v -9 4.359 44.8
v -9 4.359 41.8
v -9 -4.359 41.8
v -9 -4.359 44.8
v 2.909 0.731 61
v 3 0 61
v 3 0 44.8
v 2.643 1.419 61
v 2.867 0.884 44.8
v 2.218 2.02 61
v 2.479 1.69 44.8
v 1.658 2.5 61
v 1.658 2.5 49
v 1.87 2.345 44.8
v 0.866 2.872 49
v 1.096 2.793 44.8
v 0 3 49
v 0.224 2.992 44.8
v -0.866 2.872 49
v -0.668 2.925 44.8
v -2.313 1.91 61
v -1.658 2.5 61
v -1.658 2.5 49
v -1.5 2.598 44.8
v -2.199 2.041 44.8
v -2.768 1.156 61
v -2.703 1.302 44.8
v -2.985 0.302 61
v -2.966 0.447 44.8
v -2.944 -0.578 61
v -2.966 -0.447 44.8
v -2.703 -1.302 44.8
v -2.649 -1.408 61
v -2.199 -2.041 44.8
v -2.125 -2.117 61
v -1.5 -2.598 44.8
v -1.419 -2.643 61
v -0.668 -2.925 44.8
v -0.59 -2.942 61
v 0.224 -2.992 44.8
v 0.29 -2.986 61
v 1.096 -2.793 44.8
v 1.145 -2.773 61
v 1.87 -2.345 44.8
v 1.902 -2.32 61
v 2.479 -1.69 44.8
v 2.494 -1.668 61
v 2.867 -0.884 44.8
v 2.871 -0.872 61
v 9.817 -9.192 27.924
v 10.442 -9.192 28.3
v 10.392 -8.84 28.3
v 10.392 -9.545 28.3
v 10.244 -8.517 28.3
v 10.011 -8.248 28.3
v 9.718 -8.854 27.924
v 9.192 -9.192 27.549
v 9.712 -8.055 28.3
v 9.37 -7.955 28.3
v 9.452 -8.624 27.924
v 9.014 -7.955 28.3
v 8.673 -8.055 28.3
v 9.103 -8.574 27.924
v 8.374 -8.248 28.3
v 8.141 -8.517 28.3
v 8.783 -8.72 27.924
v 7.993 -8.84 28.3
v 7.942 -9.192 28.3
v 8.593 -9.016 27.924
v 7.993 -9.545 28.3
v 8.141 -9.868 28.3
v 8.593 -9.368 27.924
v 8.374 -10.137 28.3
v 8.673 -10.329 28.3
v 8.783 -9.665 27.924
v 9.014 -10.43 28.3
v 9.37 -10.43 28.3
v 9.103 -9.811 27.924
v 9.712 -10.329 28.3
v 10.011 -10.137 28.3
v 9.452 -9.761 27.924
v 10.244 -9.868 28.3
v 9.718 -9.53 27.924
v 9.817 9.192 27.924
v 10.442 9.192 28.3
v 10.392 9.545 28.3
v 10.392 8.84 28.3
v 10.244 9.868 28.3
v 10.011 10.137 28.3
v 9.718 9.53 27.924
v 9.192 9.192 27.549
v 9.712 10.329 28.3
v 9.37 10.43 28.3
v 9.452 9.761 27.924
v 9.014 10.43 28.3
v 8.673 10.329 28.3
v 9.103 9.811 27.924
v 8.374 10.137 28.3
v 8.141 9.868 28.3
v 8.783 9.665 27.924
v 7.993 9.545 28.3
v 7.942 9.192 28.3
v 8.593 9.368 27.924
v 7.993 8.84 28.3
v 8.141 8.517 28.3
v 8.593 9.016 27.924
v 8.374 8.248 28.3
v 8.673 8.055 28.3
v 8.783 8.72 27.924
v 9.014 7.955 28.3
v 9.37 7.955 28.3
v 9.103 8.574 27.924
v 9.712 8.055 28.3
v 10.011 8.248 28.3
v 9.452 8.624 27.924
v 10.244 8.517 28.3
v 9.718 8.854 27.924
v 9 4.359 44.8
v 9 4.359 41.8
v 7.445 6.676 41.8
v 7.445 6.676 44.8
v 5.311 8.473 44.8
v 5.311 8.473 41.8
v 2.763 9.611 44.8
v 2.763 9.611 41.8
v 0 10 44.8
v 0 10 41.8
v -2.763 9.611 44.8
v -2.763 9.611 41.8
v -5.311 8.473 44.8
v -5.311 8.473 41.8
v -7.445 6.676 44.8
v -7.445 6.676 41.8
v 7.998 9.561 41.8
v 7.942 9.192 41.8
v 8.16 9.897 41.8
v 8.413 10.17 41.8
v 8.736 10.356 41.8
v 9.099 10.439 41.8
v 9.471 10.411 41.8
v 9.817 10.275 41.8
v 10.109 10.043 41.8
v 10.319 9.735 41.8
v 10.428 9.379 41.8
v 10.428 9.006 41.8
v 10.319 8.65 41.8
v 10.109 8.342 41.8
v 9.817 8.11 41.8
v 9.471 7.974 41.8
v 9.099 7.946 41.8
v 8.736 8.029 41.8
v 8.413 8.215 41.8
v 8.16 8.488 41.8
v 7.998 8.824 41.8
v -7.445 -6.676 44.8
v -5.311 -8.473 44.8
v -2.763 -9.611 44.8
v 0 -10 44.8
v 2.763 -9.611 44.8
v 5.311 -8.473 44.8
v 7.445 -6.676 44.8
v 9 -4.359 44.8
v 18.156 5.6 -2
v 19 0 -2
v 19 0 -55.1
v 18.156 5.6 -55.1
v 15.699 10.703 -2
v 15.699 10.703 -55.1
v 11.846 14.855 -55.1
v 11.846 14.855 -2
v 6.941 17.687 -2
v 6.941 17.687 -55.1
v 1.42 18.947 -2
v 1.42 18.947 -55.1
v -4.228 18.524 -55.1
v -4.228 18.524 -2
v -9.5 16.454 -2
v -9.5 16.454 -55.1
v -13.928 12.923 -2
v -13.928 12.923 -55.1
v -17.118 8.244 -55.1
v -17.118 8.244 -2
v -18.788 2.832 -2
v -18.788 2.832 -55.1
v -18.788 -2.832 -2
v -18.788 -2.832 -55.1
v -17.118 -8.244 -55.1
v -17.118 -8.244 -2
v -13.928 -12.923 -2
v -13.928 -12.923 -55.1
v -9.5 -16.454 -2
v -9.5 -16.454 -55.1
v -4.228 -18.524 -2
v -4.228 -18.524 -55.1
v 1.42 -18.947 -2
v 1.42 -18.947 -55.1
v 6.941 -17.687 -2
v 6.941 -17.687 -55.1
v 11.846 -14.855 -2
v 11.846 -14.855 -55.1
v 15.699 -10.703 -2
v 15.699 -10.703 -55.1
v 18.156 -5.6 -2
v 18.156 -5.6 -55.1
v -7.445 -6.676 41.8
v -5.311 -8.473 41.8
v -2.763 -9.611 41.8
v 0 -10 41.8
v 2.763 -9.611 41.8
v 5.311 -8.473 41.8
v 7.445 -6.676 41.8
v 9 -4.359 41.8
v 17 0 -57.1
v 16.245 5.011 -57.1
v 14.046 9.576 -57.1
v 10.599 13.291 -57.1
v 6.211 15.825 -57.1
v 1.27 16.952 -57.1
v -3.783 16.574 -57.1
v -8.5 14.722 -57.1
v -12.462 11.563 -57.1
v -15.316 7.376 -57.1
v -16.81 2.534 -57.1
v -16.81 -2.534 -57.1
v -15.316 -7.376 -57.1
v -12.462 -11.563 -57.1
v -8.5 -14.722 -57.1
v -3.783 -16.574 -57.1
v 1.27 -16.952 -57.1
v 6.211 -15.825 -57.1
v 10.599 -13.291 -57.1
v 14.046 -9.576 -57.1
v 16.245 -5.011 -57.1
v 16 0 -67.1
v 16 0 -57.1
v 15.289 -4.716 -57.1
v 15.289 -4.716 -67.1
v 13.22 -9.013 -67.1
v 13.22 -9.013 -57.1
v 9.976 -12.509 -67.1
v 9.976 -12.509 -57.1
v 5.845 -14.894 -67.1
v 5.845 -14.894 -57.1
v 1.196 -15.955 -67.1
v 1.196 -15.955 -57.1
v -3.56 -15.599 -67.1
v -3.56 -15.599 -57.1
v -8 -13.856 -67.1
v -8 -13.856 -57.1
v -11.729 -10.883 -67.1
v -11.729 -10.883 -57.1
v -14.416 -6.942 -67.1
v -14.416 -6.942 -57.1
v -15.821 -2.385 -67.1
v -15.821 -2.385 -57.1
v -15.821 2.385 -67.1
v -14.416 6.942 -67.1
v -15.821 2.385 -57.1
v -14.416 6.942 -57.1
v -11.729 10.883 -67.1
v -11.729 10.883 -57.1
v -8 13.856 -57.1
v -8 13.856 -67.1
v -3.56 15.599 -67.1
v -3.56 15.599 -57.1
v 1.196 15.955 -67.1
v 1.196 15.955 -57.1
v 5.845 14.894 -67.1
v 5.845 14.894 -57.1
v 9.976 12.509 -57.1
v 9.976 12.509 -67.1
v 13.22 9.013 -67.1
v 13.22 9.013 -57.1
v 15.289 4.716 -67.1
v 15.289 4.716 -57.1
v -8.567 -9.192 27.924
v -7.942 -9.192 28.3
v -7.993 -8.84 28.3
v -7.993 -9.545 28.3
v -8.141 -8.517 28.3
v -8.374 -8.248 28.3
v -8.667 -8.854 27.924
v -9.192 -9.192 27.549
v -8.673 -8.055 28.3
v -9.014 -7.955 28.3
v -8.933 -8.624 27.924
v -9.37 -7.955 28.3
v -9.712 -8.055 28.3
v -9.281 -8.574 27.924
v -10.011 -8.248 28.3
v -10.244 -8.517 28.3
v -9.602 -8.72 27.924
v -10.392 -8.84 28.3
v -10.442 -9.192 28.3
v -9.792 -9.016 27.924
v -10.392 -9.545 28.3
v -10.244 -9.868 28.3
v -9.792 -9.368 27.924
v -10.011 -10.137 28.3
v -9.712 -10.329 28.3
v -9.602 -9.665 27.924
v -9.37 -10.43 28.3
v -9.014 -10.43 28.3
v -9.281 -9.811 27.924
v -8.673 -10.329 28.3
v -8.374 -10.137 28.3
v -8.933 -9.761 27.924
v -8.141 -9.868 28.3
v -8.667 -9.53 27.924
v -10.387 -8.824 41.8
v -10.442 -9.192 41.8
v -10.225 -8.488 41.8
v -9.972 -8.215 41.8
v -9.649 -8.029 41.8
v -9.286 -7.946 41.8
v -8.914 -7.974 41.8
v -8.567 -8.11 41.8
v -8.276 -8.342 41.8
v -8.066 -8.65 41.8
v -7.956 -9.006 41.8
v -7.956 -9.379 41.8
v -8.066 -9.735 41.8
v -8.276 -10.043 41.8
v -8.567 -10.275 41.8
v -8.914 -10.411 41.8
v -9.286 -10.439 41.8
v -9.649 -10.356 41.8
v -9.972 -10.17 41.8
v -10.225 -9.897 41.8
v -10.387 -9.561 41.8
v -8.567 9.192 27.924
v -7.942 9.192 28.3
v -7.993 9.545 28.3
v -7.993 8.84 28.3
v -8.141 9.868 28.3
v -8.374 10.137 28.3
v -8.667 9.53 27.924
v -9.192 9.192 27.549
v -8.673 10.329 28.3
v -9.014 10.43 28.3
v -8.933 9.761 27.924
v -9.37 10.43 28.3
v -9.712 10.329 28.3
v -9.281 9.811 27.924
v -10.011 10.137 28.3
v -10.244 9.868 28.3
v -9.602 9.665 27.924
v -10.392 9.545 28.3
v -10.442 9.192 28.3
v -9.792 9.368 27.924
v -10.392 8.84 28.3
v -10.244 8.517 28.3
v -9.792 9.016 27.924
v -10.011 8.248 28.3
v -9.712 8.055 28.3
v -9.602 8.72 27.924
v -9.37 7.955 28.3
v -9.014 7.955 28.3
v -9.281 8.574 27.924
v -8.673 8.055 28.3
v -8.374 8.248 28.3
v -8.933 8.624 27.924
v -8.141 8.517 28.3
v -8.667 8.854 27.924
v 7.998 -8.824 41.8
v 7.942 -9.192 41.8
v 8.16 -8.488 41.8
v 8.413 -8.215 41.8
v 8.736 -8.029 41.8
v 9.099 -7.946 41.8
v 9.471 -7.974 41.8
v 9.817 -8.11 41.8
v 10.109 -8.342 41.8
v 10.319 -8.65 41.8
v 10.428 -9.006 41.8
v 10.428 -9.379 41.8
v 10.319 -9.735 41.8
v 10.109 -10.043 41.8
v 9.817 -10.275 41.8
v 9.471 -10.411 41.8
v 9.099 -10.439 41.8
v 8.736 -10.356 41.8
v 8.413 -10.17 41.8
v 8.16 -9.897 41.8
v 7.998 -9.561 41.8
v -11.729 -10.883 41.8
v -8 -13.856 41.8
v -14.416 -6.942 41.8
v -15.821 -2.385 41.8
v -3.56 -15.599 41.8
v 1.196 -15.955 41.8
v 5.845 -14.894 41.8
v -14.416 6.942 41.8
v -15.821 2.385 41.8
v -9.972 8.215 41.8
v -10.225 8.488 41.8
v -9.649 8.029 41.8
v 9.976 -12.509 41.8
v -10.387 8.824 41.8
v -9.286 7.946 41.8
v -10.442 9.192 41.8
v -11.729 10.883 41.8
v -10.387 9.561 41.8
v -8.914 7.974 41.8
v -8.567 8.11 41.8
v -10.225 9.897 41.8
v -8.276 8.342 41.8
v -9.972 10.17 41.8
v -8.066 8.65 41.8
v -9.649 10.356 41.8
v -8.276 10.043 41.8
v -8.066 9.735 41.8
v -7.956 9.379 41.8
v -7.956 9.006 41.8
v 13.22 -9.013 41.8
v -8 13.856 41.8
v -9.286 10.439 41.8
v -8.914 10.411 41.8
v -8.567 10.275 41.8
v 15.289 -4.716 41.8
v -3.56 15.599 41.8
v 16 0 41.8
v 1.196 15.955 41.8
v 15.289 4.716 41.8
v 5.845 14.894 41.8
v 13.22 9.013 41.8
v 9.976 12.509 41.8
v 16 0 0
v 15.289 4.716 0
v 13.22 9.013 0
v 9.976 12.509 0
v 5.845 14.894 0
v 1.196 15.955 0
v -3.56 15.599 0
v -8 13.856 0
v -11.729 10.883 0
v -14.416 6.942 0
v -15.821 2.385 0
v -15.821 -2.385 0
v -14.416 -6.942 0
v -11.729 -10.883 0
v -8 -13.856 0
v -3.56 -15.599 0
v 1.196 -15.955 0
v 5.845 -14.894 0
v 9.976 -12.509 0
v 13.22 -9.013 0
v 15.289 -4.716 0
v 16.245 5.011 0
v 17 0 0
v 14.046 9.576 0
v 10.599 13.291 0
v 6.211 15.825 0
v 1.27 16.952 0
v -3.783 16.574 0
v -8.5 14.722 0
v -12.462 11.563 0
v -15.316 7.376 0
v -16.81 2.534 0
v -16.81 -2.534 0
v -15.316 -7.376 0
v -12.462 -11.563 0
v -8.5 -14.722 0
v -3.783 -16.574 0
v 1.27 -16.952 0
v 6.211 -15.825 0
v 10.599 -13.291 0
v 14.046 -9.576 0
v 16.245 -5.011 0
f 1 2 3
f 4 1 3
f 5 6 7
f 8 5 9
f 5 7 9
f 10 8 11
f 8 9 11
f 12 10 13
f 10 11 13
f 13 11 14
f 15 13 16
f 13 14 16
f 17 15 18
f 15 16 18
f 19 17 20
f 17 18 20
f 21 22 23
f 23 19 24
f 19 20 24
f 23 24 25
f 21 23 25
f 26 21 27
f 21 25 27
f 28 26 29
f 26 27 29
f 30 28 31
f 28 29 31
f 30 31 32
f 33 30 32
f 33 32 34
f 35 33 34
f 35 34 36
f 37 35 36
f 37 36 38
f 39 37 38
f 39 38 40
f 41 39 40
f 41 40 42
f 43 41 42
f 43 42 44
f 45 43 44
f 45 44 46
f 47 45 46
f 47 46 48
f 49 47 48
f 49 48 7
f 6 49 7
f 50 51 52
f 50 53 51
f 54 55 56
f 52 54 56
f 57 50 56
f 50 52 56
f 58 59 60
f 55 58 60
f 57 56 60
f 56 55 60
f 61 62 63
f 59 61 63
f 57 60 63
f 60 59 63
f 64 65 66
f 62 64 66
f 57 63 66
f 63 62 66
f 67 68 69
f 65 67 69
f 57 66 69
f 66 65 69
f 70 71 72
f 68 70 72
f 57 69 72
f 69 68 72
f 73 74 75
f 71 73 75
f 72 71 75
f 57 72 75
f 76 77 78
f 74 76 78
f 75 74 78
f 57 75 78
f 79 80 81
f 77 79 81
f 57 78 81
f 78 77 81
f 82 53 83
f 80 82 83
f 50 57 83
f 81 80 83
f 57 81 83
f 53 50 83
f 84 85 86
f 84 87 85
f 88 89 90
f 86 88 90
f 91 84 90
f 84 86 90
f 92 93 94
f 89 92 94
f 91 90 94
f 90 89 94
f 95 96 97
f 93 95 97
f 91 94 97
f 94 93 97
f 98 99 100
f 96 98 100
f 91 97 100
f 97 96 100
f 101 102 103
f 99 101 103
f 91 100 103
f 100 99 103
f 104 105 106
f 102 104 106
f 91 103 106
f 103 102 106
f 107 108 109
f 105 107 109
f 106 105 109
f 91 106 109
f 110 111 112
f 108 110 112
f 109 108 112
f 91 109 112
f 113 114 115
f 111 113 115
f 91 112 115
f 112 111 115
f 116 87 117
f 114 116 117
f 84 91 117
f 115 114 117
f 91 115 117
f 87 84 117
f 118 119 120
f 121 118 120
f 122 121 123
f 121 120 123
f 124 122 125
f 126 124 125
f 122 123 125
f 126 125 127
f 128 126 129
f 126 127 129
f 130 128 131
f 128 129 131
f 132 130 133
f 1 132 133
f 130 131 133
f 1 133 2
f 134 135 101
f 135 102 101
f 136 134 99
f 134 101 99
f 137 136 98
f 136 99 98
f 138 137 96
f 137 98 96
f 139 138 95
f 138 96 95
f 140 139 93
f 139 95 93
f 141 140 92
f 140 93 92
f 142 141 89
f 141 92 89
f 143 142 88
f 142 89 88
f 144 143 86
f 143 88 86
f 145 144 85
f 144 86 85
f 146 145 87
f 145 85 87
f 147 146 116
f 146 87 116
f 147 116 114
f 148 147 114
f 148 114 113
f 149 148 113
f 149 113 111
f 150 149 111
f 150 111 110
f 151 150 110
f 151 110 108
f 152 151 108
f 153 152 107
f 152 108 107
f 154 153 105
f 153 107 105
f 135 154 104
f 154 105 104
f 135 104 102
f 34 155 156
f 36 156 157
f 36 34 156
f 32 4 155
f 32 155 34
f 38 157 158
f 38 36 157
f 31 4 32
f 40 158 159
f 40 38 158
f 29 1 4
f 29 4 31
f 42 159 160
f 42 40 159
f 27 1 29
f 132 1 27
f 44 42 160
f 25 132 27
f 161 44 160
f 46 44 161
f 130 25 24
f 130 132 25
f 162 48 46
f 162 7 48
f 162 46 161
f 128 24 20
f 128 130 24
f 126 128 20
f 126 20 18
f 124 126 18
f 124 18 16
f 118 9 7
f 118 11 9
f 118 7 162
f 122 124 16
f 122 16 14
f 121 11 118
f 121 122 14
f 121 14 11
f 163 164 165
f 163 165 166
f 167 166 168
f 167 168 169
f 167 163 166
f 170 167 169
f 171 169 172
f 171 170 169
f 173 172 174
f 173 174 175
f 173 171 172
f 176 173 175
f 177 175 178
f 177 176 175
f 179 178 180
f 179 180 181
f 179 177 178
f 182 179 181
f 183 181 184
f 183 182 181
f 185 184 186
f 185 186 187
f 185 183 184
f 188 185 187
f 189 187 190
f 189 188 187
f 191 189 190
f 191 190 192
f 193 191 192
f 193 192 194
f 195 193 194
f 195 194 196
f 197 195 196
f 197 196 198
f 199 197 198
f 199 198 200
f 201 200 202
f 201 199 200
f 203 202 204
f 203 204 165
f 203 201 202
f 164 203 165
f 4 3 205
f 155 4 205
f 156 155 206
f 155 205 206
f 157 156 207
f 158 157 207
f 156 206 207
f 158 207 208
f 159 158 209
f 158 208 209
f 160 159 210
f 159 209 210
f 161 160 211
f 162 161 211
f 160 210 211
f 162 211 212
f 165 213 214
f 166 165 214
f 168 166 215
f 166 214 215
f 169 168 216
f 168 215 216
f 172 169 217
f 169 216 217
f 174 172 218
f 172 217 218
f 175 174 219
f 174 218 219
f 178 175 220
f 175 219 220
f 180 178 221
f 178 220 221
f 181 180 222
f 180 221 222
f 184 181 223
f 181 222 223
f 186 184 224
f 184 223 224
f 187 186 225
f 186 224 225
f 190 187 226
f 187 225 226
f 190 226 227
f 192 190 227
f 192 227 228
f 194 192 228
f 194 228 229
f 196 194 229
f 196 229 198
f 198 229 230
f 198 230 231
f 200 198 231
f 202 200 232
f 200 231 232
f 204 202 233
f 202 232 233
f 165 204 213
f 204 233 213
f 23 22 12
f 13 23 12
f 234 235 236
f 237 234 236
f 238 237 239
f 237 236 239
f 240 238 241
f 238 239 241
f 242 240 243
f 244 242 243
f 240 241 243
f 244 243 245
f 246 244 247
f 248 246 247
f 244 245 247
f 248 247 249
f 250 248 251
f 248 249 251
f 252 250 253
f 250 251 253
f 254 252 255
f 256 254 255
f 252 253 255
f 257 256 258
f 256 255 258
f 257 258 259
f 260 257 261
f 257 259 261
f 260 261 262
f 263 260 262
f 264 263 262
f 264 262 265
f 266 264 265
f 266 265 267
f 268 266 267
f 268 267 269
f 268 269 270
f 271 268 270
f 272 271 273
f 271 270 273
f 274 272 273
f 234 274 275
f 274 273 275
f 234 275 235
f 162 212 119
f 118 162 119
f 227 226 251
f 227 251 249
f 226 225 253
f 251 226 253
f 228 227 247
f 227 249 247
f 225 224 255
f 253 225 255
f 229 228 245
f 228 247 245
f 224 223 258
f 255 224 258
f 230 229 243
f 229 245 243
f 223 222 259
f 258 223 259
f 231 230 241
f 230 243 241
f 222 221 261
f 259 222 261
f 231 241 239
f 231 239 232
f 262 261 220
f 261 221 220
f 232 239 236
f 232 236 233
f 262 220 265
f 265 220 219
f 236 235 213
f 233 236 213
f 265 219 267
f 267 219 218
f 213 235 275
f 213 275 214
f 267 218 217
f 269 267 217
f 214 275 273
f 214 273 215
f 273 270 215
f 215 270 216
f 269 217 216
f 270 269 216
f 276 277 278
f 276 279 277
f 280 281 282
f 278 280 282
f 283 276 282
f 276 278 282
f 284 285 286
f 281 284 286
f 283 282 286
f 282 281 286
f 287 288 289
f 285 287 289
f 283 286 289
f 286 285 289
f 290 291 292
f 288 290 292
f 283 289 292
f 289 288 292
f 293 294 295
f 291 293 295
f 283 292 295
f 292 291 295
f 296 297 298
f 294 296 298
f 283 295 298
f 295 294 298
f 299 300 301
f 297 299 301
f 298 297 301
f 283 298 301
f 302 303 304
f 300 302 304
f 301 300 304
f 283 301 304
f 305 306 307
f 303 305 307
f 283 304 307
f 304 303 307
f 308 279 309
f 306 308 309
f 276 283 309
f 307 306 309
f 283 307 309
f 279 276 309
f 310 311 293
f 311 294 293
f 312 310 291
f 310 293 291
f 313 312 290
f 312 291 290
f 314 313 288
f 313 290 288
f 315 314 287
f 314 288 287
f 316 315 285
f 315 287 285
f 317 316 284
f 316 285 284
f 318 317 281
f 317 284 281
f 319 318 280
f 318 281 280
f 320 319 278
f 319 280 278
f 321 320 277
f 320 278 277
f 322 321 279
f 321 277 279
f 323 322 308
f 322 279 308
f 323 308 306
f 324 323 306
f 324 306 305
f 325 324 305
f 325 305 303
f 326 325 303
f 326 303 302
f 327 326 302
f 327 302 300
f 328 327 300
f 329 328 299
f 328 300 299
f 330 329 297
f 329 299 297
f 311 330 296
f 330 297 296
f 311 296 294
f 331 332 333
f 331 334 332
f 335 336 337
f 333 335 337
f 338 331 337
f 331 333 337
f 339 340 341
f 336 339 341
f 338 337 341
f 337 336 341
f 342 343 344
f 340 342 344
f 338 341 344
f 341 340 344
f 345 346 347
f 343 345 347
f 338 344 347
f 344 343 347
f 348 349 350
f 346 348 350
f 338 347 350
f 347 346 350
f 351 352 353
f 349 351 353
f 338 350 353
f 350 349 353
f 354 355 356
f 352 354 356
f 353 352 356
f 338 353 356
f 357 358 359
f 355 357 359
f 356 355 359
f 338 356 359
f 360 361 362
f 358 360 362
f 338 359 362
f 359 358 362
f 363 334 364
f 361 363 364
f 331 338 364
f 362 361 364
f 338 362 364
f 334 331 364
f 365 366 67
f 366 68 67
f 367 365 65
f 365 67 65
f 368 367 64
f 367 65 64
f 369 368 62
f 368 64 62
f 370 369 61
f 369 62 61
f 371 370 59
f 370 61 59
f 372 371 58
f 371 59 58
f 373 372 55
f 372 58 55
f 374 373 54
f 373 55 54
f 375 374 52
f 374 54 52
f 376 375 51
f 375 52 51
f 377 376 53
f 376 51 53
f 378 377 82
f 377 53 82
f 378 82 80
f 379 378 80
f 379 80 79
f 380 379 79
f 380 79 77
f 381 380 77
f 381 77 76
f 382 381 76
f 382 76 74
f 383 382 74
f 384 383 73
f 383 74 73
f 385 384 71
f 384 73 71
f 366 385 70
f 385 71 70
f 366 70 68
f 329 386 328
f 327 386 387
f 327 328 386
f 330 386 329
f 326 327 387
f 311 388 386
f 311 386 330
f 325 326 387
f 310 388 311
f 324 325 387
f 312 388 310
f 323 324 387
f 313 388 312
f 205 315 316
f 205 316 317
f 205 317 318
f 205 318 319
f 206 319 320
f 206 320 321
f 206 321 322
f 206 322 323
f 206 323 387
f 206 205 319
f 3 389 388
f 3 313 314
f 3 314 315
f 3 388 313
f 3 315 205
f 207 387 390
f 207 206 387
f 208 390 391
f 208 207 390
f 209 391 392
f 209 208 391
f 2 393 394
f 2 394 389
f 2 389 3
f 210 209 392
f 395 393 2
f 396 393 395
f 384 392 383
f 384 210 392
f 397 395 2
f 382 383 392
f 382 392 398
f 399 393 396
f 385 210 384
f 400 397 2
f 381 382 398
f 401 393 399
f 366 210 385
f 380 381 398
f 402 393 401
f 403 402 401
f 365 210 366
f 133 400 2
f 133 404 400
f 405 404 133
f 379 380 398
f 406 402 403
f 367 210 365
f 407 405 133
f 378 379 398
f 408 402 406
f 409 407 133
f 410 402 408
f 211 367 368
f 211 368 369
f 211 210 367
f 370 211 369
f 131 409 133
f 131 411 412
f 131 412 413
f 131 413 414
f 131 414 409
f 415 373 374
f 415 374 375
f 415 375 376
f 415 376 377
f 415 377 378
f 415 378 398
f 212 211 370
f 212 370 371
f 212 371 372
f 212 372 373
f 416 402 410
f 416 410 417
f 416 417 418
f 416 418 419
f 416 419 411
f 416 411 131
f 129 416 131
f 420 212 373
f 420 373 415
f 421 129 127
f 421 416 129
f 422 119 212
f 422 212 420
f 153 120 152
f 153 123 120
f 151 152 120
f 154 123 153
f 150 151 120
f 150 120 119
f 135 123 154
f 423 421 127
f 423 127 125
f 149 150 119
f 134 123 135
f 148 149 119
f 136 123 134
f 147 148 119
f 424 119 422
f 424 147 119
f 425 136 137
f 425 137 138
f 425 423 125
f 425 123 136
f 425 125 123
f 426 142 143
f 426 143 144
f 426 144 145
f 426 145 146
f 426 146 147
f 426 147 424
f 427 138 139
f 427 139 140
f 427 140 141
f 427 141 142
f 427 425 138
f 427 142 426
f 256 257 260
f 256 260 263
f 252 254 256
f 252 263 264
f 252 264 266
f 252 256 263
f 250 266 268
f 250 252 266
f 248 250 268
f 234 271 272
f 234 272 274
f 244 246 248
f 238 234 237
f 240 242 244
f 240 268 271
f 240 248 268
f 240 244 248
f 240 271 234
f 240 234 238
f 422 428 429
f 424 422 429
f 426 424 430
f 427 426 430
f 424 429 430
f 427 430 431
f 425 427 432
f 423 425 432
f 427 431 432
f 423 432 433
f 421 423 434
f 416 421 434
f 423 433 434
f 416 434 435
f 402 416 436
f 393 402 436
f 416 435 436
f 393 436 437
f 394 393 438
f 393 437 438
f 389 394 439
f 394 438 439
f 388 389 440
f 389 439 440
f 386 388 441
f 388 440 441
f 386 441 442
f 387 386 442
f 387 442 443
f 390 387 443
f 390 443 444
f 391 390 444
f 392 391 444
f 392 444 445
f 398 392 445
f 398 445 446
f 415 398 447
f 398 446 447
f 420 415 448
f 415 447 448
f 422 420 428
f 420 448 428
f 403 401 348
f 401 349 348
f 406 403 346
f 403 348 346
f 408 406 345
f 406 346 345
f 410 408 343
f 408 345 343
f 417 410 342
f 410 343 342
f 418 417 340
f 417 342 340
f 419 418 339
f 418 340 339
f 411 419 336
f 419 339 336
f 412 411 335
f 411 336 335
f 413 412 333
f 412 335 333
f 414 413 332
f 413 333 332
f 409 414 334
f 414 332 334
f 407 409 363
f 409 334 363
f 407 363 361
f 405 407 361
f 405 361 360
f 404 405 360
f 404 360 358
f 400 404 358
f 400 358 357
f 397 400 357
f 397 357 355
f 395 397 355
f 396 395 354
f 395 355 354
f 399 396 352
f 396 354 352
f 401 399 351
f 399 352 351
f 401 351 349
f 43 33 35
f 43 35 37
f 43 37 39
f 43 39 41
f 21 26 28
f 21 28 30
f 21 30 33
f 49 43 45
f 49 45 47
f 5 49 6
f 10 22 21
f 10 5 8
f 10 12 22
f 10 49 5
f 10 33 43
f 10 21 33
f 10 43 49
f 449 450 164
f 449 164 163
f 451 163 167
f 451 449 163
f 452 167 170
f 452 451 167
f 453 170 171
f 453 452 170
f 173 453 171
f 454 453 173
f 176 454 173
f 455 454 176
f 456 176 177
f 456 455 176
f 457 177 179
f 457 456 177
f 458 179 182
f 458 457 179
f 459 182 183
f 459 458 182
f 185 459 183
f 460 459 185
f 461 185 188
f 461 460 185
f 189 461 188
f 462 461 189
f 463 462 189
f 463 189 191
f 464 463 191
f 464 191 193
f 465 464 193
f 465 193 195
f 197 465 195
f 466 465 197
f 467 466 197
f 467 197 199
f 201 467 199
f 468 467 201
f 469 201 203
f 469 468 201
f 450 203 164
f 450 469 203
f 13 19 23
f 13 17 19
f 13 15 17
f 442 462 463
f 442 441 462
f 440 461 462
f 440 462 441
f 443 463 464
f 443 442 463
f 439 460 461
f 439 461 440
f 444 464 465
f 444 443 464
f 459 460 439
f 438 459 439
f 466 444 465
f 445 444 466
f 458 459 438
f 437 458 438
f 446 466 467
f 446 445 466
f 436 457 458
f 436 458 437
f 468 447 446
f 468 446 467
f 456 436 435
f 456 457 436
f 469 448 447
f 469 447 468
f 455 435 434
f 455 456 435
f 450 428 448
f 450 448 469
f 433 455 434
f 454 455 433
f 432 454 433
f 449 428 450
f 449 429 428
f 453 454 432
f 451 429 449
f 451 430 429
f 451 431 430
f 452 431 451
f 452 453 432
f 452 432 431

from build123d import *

# Parameters (mm, degrees)
F0_R      = 19
F1_DEPTH  = 57.1
F2_R      = 16
F3_DEPTH  = 41.8
F4_R      = 16
F5_DEPTH  = 10
F7_DEPTH  = 3
F8_R      = 3
F9_DEPTH  = 16.2
F10_W     = 3.3166247904
F10_H     = 0.5
F11_DEPTH = 12
F12_SIZE  = 2
F14_D     = 2.5
F14_DEPTH = 13.5
F14_TIP   = 0.7510757738


with BuildPart() as f1:
    # F0 (on Top) → F1 (new body)
    with BuildSketch(Plane.XY):
        Circle(F0_R)
    extrude(amount=-F1_DEPTH)

    # F2 (on face) → F3 (join)
    with BuildSketch(Plane.XY):
        Circle(F2_R)
    extrude(amount=F3_DEPTH)

    # F4 (on face) → F5 (join)
    with BuildSketch(Plane(origin=(0, 0, -57.1), x_dir=(1, 0, 0), z_dir=(0, 0, -1))):
        Circle(F4_R)
    extrude(amount=F5_DEPTH)

    # F6 (on face) → F7 (join)
    with BuildSketch(Plane.XY.offset(41.8)):
        with BuildLine():
            ThreePointArc((9, 4.3588989435), (0, 10), (-9, 4.3588989435))
            Line((-9, 4.3588989435), (-9, -4.3588989435))
            ThreePointArc((-9, -4.3588989435), (0, -10), (9, -4.3588989435))
            Line((9, -4.3588989435), (9, 4.3588989435))
        make_face()
    extrude(amount=F7_DEPTH)

    # F8 (on face) → F9 (join)
    with BuildSketch(Plane.XY.offset(44.8)):
        Circle(F8_R)
    extrude(amount=F9_DEPTH)

    # F10 (on face) → F11 (cut)
    with BuildSketch(Plane.XY.offset(61)):
        with Locations((0, 2.75)):
            Rectangle(F10_W, F10_H)
    extrude(amount=-F11_DEPTH, mode=Mode.SUBTRACT)

    # F12
    f12_edges = [f1.edges().sort_by_distance(p)[0] for p in [
        (-19, 0, -57.1),
        (-19, 0, 0),
    ]]
    chamfer(f12_edges, length=F12_SIZE)

    # F14
    with Locations(Plane.XY.offset(41.8)):
        with Locations((-9.1923881554, 9.1923881554), (9.1923881554, 9.1923881554), (9.1923881554, -9.1923881554), (-9.1923881554, -9.1923881554)):
            Hole(F14_D / 2, depth=F14_DEPTH)
            with Locations((0, 0, -(F14_DEPTH + F14_TIP / 2))):  # 118° drill point
                Cone(0, F14_D / 2, F14_TIP, mode=Mode.SUBTRACT)


solid = f1.part
